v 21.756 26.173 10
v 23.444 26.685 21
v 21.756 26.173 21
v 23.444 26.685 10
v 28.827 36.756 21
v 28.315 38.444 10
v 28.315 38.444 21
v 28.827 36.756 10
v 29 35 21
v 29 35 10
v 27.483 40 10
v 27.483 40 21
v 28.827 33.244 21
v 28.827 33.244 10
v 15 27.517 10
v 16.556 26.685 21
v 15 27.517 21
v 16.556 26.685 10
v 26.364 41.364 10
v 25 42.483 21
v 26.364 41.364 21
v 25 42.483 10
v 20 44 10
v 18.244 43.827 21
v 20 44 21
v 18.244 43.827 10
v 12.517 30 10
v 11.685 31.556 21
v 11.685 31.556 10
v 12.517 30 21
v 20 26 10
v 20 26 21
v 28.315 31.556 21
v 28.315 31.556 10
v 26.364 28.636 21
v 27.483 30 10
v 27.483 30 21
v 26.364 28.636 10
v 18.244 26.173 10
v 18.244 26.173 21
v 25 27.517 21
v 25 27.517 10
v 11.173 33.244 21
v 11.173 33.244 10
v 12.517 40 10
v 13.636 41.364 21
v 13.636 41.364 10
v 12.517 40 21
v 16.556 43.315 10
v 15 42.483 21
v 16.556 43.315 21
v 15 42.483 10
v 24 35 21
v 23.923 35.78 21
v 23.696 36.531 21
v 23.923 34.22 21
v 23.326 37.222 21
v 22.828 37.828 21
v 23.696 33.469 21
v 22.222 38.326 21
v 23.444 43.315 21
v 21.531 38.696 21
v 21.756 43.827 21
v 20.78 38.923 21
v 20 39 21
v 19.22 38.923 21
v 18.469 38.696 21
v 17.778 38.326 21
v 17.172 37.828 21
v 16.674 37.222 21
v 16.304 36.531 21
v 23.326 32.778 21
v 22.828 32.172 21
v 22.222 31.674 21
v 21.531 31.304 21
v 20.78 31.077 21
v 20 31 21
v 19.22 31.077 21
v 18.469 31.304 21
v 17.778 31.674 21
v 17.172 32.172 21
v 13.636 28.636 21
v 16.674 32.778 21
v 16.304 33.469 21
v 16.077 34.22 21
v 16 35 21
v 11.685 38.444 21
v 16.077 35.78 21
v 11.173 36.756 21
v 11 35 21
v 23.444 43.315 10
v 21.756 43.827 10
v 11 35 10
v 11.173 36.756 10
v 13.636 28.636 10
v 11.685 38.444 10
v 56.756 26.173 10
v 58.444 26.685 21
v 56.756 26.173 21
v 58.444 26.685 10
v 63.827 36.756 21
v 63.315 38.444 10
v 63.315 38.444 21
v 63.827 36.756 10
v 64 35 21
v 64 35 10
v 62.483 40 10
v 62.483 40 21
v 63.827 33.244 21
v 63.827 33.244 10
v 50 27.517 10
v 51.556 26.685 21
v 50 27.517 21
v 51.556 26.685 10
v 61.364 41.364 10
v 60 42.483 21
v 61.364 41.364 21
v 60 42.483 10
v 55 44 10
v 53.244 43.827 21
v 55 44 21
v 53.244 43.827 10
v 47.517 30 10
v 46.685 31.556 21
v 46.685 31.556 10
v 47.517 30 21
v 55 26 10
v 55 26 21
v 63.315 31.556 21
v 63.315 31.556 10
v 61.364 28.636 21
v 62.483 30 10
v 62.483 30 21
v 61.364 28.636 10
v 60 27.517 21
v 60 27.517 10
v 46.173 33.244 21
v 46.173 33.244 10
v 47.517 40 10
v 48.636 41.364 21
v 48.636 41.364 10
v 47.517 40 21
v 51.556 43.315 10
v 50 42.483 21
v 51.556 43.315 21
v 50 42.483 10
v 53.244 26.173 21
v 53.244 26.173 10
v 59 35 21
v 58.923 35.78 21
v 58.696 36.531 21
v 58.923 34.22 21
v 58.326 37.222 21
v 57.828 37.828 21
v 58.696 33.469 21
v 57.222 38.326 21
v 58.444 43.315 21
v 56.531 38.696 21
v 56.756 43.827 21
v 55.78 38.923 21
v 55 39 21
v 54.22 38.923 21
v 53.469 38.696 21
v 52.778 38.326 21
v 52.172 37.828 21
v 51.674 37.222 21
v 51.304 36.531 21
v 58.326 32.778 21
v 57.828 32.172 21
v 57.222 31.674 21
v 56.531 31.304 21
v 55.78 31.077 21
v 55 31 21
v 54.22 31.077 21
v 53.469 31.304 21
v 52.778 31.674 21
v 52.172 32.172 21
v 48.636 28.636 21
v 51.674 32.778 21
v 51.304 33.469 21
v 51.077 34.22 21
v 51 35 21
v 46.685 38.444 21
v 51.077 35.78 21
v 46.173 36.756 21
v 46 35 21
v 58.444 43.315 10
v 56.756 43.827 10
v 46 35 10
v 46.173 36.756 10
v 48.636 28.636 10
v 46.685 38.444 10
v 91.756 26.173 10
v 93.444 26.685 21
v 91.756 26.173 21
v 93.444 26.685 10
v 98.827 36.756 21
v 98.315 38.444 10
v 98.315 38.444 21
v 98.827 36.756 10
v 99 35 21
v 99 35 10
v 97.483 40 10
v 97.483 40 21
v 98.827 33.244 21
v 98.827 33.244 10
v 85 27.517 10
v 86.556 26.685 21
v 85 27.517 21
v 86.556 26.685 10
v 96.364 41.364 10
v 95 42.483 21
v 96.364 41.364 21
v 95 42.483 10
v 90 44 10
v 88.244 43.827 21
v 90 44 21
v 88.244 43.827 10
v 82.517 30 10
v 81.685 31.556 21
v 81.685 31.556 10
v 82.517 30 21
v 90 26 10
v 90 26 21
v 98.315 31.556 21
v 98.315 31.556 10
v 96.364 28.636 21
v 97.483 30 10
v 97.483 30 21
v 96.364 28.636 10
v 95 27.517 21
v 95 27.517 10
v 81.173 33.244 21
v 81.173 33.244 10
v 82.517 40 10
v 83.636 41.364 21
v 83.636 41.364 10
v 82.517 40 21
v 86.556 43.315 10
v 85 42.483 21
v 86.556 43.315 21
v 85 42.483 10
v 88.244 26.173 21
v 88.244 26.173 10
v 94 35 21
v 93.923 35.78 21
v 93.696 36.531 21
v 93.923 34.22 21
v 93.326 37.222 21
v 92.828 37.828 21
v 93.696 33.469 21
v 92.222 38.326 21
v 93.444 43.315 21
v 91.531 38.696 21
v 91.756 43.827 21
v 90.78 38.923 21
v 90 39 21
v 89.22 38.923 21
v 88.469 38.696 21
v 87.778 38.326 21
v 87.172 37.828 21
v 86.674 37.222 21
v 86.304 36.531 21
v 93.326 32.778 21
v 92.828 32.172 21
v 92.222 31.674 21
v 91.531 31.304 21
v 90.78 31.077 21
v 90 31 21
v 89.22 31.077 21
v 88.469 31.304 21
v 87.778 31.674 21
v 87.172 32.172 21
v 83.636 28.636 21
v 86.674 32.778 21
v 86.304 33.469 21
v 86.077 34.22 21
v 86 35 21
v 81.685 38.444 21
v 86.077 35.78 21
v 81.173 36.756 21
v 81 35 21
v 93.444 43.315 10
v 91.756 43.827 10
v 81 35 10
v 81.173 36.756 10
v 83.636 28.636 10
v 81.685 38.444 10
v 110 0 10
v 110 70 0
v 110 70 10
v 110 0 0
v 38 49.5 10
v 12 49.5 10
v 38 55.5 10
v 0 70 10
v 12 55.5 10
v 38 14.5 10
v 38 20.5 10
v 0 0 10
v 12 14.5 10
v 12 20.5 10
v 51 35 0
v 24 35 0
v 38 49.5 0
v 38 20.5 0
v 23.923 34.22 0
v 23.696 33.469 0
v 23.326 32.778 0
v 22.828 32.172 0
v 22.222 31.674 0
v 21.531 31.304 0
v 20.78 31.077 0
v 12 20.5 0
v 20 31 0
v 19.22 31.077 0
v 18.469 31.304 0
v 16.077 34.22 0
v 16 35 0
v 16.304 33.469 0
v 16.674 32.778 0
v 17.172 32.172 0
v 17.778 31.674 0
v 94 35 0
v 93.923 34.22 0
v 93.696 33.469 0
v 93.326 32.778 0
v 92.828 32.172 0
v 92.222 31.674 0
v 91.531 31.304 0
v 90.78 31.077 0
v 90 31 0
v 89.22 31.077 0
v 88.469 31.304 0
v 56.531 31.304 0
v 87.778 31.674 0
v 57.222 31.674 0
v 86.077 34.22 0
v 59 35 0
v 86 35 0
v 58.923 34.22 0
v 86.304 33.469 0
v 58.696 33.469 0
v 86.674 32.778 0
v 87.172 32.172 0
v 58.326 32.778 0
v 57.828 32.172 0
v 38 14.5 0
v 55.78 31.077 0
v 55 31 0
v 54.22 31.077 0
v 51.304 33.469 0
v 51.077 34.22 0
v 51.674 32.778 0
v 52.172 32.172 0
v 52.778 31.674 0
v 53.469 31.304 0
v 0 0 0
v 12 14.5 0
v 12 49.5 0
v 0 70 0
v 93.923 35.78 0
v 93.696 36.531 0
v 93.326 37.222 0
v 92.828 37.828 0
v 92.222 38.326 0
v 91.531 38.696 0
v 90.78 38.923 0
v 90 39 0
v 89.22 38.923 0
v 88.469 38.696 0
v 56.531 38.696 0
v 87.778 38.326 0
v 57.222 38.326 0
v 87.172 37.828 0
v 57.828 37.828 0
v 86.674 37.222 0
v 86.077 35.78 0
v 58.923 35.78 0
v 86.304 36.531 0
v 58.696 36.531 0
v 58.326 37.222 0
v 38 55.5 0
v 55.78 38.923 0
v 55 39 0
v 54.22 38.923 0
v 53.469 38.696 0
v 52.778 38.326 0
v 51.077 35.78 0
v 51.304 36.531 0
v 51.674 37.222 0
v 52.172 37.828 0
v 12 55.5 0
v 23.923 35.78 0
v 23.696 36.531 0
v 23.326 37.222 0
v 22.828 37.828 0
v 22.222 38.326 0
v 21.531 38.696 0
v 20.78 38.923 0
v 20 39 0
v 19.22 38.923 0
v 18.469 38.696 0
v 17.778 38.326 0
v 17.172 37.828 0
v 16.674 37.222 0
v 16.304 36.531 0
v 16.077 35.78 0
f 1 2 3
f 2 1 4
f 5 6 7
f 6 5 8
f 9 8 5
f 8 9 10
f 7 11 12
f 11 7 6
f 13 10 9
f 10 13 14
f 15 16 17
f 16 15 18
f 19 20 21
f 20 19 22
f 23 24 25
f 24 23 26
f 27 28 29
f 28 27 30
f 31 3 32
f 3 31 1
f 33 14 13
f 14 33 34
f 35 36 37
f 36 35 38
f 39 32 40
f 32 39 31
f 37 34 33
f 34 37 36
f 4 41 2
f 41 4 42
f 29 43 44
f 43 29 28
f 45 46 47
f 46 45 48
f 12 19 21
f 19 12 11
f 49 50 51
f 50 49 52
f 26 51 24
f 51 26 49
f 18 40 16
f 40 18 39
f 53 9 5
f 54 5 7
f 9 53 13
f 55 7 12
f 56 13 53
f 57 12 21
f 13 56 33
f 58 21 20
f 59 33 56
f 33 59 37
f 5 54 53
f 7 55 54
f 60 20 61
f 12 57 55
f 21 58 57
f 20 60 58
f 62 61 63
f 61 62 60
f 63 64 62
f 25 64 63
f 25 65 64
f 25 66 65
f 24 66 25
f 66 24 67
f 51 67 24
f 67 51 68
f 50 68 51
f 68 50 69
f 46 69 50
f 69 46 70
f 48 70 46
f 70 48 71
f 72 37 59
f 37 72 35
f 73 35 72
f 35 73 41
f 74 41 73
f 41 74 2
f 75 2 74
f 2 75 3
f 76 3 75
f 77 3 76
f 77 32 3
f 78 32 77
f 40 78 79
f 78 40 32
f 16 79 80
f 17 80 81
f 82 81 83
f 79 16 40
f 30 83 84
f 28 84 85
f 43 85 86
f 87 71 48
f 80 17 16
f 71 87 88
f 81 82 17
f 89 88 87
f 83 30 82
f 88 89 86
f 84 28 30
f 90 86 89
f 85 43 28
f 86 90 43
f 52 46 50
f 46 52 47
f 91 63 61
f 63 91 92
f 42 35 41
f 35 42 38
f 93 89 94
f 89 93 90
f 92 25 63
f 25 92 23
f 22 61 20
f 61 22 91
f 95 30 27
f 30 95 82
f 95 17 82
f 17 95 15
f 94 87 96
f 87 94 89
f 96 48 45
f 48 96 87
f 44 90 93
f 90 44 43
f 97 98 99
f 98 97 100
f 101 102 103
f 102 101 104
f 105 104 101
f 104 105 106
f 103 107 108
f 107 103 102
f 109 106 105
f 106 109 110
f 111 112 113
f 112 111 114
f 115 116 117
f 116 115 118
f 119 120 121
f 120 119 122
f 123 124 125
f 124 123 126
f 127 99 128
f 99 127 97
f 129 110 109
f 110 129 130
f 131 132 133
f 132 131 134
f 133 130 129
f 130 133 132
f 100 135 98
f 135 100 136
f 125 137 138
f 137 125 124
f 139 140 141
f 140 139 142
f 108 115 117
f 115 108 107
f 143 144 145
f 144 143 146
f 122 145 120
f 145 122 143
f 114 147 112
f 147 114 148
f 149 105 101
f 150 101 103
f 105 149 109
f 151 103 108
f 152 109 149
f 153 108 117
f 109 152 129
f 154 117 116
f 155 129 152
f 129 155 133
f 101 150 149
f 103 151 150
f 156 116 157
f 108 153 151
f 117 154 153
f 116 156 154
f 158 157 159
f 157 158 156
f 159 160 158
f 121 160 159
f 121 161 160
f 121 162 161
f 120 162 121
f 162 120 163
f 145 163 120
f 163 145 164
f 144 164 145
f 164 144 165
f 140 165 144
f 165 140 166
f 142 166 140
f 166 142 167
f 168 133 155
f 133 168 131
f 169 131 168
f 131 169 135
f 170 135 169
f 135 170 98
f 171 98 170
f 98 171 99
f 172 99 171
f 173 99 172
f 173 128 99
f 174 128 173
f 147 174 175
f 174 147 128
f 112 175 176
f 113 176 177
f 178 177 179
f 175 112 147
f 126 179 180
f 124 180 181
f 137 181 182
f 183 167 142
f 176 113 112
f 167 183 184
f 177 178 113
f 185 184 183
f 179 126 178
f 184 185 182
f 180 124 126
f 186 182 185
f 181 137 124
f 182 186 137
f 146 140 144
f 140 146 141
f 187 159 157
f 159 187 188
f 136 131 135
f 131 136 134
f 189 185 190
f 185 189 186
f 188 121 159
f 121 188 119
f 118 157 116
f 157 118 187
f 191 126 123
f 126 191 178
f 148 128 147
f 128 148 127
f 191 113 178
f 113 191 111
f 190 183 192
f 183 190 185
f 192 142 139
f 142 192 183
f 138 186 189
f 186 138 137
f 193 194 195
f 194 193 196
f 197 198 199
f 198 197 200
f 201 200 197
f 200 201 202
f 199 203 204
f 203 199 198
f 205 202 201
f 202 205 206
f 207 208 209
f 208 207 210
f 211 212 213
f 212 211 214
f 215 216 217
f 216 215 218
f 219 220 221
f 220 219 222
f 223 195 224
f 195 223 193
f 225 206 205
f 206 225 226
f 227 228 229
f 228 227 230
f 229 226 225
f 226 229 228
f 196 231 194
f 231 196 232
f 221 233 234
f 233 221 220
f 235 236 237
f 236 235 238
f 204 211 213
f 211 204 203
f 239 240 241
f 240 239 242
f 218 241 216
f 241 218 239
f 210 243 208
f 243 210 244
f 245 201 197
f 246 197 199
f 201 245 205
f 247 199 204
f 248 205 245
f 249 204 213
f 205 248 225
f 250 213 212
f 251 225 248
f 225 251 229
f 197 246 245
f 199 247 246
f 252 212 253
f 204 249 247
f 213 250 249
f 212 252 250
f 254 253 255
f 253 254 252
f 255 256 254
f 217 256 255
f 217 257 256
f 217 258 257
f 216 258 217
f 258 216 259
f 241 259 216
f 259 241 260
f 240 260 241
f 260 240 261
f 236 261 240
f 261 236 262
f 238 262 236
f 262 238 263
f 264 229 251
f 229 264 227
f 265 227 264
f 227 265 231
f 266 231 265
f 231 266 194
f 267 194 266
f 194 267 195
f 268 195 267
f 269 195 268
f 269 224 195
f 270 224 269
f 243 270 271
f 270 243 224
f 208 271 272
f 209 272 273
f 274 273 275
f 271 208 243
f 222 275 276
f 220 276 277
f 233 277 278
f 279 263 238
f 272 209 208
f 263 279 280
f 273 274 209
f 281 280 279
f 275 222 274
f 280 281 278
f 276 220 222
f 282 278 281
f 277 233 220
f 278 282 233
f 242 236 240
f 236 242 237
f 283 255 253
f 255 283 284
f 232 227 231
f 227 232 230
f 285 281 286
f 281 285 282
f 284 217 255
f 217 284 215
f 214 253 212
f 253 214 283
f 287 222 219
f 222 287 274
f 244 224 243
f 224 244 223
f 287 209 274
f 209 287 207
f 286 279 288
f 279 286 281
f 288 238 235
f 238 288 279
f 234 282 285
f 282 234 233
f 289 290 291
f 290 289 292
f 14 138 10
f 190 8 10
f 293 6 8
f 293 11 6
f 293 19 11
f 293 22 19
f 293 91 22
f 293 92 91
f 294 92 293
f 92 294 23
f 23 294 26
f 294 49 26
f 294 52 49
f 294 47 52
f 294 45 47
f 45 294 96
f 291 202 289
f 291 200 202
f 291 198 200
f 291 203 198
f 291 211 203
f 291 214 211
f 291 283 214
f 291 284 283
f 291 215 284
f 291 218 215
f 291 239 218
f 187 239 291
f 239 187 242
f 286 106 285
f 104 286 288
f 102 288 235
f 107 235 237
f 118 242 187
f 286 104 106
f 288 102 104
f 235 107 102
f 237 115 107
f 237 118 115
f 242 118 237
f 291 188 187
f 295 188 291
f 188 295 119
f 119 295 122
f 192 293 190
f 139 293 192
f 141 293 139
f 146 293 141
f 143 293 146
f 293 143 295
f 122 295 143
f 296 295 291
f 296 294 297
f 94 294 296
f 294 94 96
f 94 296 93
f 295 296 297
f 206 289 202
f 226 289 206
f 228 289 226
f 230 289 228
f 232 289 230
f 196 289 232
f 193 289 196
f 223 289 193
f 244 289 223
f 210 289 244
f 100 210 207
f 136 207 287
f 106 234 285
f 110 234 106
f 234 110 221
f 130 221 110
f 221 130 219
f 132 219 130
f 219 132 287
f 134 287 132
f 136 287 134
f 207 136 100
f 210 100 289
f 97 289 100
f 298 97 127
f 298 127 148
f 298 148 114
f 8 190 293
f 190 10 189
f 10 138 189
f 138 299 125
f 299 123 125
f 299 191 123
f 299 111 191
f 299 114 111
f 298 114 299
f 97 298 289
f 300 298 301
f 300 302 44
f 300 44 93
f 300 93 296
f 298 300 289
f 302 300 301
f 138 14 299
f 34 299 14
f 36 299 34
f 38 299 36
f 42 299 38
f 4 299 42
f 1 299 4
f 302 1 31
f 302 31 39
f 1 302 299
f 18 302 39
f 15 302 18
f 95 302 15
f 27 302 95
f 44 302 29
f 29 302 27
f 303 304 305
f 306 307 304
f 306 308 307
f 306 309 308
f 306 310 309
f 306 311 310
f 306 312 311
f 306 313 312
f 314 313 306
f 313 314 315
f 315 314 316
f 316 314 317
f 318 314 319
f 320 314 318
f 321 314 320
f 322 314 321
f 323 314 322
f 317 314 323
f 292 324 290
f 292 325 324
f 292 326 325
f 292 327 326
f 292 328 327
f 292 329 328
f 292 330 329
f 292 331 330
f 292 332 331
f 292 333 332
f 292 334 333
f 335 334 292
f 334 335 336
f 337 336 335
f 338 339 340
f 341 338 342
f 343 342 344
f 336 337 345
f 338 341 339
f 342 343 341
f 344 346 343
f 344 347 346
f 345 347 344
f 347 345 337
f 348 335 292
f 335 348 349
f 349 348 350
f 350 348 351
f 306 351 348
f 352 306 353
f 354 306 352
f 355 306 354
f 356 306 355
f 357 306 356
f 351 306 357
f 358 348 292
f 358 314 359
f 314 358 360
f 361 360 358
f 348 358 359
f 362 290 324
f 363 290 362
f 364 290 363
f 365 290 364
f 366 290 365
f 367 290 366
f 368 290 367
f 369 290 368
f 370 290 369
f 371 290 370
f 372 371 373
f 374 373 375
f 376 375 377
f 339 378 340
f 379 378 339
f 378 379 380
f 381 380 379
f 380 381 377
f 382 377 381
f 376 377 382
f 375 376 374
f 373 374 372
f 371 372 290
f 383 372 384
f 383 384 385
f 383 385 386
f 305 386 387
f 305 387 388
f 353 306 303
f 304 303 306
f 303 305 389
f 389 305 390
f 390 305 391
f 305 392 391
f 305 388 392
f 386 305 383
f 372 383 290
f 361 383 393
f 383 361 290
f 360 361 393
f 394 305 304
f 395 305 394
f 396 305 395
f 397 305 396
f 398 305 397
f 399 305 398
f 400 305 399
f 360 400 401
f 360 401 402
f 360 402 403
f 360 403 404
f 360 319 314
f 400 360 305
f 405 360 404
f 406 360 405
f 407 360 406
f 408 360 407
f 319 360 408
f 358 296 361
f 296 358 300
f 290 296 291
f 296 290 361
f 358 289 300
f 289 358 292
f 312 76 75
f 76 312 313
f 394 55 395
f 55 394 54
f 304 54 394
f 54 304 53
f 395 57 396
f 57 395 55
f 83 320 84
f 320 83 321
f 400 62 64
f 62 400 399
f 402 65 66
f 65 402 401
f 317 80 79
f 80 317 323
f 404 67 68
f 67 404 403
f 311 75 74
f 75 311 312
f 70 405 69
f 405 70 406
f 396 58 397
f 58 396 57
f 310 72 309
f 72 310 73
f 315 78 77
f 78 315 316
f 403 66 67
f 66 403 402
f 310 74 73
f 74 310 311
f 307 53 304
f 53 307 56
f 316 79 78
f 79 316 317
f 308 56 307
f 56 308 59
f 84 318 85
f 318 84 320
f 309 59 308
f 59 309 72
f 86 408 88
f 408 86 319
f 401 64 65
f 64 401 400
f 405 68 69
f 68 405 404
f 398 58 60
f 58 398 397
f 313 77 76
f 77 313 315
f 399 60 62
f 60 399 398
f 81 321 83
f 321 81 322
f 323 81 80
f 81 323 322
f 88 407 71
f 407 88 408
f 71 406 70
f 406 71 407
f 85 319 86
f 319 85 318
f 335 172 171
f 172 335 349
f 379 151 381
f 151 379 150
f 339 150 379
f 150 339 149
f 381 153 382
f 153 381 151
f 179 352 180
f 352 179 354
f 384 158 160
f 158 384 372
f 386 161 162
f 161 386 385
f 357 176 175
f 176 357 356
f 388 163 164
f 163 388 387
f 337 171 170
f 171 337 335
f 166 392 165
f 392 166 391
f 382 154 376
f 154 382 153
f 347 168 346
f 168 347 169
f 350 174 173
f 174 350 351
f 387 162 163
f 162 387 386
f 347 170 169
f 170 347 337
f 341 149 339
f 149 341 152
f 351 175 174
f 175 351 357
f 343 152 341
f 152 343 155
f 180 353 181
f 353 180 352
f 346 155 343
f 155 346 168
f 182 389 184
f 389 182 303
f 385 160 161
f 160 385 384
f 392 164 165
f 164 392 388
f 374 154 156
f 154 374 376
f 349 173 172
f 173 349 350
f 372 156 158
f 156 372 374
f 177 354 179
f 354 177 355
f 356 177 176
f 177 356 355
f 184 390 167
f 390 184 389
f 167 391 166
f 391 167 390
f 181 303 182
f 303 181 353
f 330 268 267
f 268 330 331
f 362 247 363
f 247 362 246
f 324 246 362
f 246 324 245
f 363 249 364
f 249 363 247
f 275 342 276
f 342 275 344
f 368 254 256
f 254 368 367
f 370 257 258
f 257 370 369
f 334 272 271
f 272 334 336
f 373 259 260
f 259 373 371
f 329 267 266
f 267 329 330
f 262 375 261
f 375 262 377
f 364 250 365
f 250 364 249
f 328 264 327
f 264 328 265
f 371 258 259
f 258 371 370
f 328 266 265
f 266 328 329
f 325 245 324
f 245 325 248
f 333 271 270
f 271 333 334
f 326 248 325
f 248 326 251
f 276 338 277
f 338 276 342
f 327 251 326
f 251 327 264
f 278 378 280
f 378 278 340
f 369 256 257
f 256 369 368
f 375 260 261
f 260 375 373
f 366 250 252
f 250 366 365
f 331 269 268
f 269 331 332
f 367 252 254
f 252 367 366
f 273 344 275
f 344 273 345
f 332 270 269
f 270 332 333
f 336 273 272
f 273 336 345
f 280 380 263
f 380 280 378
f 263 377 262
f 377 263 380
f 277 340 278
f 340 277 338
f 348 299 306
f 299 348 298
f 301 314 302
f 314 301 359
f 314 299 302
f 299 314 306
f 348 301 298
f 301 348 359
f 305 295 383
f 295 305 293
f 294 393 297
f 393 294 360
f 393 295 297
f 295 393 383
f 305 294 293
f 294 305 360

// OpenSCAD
$fn = 32;

// ----------------------------------------------------------------------
// Drill jig: three_boss_slot jig
// ----------------------------------------------------------------------

// --- parameters (mm) ---
plate_l = 110;            // plate length, X
plate_w = 70;             // plate width, Y
plate_t = 10;             // plate thickness
boss_d = 18;              // guide boss diameter
boss_h = 12;              // boss height above the plate
guide_d = 8;              // guide hole diameter
boss_pitch = 35;          // boss pitch
slot_w = 6;               // clamp slot width
slot_l = 26;              // clamp slot length
slot_x = 12;              // slot start X

n_boss = 3;  // guide bosses
boss_x0 = (plate_l - (n_boss - 1) * boss_pitch) / 2;  // first boss X
boss_top = plate_t - 1 + boss_h;  // boss crown height
total_h = boss_top;  // overall height

difference() {
  union() {
  cube([plate_l, plate_w, plate_t]);
  for (i = [0 : n_boss - 1])
    translate([boss_x0 + i * boss_pitch, plate_w / 2, plate_t - 1])
      cylinder(h = boss_h, d = boss_d);
  }
  for (i = [0 : n_boss - 1])
    translate([boss_x0 + i * boss_pitch, plate_w / 2, -1])
      cylinder(h = plate_t + boss_h, d = guide_d);
  for (cy = [plate_w * 0.25, plate_w * 0.75])
    translate([slot_x, cy - slot_w / 2, -1])
      cube([slot_l, slot_w, plate_t + 2]);
}
